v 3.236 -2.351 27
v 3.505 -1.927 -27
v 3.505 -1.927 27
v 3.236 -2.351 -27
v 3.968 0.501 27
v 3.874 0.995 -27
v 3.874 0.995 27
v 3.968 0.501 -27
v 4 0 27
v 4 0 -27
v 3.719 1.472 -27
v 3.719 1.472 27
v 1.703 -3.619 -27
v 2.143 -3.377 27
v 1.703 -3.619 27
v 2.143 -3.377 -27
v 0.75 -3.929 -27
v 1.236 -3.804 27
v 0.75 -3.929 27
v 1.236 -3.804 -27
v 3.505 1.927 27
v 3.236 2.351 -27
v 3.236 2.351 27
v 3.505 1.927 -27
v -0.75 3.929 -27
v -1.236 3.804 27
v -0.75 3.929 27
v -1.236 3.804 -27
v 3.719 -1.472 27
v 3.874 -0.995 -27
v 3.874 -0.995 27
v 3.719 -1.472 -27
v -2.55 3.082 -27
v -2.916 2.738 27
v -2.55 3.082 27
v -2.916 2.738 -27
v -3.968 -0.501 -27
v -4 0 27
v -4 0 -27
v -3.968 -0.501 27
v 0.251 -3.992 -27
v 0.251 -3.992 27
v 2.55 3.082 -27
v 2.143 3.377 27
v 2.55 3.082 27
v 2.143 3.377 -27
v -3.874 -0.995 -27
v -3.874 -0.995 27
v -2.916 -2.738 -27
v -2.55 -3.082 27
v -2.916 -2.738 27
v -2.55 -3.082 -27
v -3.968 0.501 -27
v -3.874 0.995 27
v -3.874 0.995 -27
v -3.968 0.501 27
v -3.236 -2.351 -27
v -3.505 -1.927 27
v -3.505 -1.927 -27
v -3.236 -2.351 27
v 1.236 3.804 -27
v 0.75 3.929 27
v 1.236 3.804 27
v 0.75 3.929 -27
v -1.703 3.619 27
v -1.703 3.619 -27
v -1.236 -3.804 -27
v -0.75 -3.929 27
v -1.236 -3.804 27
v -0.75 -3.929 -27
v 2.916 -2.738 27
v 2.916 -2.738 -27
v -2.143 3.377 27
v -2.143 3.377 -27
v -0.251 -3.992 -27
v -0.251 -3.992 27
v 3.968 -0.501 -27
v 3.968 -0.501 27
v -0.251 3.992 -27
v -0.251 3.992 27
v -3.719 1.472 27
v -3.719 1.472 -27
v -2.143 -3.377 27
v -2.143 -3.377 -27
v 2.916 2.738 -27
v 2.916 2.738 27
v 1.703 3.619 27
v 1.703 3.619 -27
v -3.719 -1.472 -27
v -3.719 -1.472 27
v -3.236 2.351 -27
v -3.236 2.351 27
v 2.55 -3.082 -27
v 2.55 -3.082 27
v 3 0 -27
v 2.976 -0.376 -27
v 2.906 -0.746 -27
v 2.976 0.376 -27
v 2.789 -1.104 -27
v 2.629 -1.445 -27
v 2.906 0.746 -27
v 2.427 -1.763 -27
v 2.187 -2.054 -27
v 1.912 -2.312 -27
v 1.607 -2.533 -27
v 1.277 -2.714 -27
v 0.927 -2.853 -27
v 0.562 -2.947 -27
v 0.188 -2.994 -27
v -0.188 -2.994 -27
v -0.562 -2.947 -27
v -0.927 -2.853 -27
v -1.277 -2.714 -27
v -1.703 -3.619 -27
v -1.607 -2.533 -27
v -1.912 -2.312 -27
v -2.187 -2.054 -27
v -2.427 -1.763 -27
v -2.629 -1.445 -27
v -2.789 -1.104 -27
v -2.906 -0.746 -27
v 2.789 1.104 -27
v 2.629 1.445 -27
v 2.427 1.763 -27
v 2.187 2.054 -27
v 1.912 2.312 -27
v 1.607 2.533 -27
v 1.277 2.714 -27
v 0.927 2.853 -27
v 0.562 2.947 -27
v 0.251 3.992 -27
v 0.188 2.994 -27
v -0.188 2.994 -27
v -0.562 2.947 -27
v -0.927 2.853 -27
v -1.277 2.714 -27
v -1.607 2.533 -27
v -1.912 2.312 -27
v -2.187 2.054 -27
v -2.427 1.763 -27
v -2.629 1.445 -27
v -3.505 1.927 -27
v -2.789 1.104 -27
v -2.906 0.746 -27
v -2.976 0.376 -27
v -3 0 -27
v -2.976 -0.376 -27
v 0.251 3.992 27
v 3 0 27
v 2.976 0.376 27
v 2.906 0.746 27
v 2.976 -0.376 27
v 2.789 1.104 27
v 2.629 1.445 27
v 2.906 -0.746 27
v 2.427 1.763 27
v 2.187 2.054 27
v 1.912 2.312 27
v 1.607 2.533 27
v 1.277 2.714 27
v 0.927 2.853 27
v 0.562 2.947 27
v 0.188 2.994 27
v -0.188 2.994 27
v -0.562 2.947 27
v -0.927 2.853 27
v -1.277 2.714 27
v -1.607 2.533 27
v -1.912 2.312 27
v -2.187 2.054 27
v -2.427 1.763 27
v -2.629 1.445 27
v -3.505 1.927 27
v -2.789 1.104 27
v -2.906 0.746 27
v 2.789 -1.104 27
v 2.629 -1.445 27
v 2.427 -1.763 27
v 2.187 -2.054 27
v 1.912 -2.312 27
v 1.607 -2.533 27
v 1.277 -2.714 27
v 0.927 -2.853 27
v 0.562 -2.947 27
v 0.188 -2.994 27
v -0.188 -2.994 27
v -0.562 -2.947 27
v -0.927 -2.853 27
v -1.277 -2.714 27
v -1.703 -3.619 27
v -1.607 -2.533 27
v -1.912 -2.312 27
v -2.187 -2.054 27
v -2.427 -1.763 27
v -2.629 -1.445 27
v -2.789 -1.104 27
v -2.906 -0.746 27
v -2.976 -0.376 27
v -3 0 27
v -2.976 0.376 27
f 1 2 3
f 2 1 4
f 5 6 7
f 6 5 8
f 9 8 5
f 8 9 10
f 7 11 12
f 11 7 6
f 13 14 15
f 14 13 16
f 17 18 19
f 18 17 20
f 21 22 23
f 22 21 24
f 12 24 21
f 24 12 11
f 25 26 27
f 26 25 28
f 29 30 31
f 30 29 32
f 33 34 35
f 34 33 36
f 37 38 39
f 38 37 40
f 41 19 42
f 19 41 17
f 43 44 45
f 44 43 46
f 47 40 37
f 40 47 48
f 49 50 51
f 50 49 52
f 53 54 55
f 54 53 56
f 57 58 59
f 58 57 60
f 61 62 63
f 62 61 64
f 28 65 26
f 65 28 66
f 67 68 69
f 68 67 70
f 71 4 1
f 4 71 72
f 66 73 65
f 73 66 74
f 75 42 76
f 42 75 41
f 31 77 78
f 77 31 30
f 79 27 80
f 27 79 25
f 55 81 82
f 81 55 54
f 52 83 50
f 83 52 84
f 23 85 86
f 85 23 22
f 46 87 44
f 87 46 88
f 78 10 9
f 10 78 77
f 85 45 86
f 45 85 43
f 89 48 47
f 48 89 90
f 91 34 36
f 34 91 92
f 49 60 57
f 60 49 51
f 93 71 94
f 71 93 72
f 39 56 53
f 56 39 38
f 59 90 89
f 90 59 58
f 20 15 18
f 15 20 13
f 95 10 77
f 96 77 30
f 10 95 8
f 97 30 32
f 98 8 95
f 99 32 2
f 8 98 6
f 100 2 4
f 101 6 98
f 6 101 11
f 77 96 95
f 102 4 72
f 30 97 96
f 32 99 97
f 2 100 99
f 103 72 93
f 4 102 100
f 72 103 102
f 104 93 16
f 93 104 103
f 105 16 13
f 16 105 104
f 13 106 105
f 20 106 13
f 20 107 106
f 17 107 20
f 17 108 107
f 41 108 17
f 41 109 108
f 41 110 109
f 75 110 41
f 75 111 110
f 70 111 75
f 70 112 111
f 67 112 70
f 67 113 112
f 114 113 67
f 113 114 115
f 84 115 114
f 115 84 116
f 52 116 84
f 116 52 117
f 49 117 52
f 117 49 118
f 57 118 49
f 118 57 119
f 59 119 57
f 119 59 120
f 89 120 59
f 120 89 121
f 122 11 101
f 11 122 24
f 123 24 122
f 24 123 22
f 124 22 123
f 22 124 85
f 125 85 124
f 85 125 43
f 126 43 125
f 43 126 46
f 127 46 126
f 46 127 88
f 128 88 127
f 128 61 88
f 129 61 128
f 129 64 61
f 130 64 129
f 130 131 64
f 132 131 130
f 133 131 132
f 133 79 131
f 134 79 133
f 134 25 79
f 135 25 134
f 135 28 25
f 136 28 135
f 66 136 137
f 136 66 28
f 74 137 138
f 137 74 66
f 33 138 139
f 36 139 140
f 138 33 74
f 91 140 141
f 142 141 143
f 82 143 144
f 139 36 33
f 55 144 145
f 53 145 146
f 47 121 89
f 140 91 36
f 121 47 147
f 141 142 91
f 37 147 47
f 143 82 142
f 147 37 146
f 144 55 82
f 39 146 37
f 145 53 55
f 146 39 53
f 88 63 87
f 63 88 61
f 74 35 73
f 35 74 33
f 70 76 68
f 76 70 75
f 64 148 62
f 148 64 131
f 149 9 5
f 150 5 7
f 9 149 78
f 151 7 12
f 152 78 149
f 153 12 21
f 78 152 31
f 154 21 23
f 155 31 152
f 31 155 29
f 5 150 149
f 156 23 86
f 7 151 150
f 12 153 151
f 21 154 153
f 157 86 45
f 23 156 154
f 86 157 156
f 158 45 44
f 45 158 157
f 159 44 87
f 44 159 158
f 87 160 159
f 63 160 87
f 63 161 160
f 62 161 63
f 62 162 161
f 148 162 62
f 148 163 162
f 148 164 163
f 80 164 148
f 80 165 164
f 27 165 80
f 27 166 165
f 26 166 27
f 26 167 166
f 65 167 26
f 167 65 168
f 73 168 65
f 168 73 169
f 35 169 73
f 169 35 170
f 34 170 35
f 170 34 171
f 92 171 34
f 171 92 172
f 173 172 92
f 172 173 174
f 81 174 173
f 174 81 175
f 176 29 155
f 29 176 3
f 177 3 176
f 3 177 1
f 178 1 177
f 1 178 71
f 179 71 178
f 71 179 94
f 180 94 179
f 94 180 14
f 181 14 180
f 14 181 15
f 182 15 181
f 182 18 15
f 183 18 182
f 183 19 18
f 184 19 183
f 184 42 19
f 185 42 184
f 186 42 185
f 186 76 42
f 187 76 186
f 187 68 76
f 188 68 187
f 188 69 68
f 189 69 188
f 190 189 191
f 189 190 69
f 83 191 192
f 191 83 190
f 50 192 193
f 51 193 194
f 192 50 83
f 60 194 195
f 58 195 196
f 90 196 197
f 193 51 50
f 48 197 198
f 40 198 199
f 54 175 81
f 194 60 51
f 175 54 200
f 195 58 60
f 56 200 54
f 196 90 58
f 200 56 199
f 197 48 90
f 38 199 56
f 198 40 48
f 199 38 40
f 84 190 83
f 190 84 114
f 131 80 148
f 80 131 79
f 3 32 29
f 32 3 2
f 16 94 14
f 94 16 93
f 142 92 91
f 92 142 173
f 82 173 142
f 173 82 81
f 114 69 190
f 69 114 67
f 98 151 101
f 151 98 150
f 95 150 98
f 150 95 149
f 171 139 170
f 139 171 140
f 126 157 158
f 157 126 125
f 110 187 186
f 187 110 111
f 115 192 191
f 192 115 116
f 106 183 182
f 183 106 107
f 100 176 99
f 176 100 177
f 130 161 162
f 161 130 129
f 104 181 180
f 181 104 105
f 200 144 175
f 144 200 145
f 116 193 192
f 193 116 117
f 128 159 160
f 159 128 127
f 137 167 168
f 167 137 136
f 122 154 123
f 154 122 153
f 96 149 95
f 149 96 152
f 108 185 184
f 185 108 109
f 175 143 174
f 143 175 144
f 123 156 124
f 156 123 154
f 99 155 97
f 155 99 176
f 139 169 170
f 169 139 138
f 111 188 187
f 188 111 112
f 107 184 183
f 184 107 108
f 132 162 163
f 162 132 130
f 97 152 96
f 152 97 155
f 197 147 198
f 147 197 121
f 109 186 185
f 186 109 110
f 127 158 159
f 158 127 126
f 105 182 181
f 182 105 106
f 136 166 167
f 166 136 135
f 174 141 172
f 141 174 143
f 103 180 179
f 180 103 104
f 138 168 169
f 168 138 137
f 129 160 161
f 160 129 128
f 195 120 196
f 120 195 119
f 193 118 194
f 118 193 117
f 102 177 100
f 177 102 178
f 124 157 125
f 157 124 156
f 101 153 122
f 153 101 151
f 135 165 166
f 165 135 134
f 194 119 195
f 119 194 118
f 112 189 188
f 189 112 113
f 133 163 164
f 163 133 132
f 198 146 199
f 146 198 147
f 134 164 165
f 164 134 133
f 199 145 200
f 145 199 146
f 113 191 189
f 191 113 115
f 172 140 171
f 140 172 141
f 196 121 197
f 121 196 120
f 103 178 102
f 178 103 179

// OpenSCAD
$fn = 50;


difference() {
	union() {
		translate(v = [0, 0, -27.0000000000]) {
			cylinder(h = 54, r = 4.0000000000);
		}
	}
	union() {
		translate(v = [0, 0, -100.0000000000]) {
			cylinder(h = 200, r = 3.0000000000);
		}
	}
}
